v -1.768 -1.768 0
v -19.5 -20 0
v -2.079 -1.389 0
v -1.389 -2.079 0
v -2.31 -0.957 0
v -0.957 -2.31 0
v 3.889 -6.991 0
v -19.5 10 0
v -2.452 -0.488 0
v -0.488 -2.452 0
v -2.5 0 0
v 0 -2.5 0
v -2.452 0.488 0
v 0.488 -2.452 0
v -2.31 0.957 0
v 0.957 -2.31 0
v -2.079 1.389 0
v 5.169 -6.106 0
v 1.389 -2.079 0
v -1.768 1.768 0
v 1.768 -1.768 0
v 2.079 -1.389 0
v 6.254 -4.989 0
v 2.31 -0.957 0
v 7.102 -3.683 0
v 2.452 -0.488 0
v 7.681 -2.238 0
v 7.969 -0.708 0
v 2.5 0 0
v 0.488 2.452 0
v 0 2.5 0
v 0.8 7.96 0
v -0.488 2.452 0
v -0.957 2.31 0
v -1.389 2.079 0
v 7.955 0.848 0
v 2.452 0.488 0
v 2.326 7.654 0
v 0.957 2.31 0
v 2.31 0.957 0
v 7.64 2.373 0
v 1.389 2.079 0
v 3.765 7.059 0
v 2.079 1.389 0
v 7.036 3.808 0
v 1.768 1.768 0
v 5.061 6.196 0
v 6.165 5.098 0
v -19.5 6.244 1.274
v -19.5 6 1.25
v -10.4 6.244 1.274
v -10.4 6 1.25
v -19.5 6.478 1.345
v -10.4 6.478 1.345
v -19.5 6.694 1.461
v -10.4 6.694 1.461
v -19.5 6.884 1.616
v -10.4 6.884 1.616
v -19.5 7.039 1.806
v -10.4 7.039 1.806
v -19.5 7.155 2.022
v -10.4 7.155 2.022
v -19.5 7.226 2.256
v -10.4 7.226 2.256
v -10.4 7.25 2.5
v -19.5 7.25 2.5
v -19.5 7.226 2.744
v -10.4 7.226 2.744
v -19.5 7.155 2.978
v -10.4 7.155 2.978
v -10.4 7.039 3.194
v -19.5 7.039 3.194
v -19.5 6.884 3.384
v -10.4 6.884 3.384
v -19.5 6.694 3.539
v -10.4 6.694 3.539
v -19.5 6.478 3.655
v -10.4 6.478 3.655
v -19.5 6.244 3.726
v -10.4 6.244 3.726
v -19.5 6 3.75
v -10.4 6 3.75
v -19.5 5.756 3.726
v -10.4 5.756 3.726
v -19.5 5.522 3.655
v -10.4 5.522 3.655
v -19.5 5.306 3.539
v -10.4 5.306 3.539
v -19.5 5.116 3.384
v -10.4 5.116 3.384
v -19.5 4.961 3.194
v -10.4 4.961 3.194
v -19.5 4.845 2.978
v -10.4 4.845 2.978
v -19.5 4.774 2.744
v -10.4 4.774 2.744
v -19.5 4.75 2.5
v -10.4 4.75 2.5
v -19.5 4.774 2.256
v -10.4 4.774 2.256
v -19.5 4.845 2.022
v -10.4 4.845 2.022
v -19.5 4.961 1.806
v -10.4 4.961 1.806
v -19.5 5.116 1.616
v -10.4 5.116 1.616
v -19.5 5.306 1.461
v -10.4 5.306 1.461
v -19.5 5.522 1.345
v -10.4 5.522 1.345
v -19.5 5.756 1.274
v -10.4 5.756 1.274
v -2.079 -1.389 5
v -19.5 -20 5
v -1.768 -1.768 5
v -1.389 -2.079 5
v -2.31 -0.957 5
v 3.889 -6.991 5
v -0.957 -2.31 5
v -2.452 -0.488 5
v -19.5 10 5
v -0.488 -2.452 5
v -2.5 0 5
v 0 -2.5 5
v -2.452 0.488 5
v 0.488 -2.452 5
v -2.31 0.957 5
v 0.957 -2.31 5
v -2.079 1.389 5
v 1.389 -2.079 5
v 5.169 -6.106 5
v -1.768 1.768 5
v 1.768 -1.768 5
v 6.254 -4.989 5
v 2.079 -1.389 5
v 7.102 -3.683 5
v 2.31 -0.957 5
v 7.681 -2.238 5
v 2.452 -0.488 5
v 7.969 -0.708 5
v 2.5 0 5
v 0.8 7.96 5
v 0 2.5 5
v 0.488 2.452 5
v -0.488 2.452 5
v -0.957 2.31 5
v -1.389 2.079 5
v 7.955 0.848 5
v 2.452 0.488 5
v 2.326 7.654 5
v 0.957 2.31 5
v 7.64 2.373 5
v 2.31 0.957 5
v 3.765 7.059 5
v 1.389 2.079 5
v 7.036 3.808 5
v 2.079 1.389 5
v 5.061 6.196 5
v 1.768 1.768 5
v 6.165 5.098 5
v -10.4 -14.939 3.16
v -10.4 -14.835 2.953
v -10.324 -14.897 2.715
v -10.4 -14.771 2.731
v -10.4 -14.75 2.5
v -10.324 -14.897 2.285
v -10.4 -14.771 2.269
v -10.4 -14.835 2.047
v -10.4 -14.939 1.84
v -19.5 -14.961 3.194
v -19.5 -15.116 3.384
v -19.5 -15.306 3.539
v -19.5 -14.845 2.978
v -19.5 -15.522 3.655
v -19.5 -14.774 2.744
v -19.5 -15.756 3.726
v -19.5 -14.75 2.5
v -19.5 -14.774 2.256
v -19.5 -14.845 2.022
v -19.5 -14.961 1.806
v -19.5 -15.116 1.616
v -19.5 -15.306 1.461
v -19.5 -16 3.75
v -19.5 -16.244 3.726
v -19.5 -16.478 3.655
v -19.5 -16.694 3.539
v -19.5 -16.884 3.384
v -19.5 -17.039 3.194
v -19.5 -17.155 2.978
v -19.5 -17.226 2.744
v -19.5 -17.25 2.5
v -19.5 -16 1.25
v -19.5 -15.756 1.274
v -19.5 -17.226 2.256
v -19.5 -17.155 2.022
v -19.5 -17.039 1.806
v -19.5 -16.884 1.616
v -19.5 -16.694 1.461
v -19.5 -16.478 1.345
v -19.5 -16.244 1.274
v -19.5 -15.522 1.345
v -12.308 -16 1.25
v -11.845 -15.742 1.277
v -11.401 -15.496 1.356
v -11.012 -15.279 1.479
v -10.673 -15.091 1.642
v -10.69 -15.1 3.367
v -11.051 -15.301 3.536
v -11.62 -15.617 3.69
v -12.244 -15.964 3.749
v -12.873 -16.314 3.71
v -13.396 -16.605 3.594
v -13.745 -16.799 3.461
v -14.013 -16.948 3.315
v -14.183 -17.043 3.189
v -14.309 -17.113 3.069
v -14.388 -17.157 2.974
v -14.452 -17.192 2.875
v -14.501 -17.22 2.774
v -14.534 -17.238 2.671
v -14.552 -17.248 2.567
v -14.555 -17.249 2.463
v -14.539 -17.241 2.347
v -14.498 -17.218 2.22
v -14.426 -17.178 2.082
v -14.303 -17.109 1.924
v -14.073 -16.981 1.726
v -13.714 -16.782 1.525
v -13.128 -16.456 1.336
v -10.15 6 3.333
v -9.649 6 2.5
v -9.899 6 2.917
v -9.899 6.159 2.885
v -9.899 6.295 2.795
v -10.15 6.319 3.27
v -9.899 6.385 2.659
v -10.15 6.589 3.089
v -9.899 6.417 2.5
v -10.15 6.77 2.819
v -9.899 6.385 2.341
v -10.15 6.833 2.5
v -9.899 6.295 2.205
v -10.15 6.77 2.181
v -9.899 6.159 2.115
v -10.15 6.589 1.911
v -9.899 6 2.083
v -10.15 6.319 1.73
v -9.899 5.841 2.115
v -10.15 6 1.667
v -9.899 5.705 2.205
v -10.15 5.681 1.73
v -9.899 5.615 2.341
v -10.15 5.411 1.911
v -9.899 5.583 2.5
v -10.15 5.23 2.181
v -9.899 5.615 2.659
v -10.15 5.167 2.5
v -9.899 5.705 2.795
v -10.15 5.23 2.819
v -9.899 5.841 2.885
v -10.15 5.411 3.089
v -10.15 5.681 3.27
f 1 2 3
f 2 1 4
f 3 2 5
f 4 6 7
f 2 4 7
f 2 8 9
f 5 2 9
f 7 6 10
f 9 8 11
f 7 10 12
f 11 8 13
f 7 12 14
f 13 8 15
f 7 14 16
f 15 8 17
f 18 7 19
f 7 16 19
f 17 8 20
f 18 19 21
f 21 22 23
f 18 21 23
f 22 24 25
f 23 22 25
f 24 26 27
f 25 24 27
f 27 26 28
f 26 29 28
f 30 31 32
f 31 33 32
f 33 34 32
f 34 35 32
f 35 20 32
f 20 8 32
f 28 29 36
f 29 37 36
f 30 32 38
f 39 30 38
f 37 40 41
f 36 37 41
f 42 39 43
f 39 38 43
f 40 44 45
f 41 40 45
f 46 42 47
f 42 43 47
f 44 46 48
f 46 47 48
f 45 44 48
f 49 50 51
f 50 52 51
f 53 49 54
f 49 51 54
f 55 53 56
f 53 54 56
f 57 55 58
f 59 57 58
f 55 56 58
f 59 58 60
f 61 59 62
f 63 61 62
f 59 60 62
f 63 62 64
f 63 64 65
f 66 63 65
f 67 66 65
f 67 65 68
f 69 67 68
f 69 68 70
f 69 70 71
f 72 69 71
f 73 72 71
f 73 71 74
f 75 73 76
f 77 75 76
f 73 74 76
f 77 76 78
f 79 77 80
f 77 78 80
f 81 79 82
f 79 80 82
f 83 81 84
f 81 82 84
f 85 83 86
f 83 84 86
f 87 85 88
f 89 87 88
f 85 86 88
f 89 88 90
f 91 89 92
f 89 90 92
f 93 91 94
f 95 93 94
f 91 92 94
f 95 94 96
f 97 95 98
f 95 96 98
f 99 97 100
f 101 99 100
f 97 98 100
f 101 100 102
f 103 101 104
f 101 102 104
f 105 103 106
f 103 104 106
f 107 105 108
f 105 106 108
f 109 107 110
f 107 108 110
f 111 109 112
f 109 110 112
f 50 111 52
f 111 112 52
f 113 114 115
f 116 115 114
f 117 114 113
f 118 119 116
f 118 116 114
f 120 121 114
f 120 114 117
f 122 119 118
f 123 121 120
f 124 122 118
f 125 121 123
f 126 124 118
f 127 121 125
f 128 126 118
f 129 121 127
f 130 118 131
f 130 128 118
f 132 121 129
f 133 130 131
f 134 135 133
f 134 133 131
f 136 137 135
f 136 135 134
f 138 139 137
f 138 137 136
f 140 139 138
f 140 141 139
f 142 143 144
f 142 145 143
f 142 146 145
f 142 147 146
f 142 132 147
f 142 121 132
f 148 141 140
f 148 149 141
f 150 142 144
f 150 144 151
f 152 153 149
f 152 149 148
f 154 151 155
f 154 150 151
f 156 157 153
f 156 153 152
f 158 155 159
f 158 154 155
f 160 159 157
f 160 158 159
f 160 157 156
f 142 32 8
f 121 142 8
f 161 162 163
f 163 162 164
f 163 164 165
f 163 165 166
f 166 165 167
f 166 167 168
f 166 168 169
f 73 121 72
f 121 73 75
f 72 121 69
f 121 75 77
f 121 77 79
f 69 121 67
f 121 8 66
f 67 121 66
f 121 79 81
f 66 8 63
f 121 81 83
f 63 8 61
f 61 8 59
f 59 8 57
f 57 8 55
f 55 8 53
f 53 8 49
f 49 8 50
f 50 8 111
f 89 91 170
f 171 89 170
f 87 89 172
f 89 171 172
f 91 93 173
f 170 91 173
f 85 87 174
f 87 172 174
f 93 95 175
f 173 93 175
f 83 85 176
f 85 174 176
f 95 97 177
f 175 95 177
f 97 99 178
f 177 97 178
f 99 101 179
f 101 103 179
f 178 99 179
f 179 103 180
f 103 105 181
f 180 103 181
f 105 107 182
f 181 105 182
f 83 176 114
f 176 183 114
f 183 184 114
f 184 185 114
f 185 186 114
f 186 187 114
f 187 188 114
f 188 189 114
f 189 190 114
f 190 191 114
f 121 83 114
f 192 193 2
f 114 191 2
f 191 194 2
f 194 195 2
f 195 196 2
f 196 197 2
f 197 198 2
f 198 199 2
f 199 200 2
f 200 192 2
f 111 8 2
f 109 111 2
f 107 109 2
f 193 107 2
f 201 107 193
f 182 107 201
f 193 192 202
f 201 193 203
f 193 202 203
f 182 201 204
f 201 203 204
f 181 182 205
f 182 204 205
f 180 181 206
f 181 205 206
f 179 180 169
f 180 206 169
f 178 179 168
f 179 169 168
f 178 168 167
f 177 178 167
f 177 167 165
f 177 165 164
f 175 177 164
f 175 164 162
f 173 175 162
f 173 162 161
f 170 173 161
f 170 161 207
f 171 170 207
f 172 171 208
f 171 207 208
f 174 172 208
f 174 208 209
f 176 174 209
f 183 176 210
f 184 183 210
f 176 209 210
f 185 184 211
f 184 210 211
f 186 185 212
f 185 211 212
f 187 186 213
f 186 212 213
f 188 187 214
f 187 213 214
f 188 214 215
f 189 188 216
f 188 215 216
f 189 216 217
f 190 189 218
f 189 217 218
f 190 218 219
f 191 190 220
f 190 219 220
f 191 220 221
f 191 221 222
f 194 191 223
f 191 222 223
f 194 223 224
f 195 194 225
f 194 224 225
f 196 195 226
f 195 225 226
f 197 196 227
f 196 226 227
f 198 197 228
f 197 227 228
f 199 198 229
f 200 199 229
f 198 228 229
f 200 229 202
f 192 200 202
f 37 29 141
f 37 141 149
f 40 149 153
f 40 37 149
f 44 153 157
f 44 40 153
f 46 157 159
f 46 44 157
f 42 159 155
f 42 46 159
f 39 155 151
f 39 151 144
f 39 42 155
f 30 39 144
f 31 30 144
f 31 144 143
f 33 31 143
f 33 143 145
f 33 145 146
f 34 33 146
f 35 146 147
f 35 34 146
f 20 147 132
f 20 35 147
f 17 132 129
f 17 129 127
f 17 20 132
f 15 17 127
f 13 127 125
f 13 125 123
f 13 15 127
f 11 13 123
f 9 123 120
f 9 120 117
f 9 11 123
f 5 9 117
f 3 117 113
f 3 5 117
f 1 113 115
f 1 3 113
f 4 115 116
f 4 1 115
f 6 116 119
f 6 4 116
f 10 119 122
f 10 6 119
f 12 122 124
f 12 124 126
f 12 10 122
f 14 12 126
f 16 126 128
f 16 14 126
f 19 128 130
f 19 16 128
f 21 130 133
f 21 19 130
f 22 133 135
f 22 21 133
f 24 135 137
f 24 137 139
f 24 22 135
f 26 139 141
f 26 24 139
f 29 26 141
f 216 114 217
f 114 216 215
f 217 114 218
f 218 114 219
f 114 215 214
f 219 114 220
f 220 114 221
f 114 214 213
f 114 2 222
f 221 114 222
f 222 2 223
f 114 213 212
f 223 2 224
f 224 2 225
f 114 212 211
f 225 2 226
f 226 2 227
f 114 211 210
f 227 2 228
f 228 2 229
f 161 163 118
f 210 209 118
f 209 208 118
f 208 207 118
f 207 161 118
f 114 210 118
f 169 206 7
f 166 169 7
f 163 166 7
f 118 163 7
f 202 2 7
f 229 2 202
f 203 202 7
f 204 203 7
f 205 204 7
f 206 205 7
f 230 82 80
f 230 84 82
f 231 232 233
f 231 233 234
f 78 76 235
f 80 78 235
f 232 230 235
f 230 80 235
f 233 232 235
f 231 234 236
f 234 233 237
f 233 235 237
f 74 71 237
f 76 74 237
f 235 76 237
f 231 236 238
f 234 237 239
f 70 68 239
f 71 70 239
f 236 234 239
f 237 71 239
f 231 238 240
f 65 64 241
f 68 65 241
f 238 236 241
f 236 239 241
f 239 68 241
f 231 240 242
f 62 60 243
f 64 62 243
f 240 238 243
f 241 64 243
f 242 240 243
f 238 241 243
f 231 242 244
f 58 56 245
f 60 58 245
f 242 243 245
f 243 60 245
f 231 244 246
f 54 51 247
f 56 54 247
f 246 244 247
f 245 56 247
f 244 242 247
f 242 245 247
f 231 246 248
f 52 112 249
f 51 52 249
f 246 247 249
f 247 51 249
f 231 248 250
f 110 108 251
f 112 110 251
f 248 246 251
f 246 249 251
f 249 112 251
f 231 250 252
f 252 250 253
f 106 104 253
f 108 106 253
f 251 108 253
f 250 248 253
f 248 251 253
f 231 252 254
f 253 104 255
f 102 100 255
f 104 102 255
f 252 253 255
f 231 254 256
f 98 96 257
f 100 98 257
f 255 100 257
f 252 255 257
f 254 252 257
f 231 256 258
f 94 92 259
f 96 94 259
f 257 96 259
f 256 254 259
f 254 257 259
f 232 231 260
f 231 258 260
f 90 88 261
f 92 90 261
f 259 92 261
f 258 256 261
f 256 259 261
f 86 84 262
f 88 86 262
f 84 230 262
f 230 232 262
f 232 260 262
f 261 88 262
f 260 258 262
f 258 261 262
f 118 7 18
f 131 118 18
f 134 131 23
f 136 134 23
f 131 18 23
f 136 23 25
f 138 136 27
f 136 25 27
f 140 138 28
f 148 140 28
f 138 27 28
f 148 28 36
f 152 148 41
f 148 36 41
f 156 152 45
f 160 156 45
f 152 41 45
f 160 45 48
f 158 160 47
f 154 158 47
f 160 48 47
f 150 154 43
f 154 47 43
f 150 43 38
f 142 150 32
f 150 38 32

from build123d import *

# Parameters (mm, degrees)
ESQUISSE1_R               = 2.5
EXTRUSION1_DEPTH          = 5
TROU_TARAUD_M3X0_51_D     = 2.5
TROU_TARAUD_M3X0_51_DEPTH = 9.1
TROU_TARAUD_M3X0_51_TIP   = 0.751075774


with BuildPart() as part:
    # Esquisse1 → Extrusion1 (new body)
    with BuildSketch(Plane.XY):
        with BuildLine():
            Line((-19.5, 10), (-19.5, -20))
            Line((-19.5, -20), (3.888568512, -6.991354299))
            ThreePointArc((3.888568512, -6.991354299), (7.834576447, 1.618459728), (0.799950986, 7.959904423))
            Line((0.799950986, 7.959904423), (-19.5, 10))
        make_face()
        Circle(ESQUISSE1_R, mode=Mode.SUBTRACT)
    extrude(amount=EXTRUSION1_DEPTH)

    # Trou taraudé M3x0.51
    with Locations(Plane.ZY.offset(19.5)):
        with Locations((2.5, 6), (2.5, -16)):
            Hole(TROU_TARAUD_M3X0_51_D / 2, depth=TROU_TARAUD_M3X0_51_DEPTH)
            with Locations((0, 0, -(TROU_TARAUD_M3X0_51_DEPTH + TROU_TARAUD_M3X0_51_TIP / 2))):  # 118° drill point
                Cone(0, TROU_TARAUD_M3X0_51_D / 2, TROU_TARAUD_M3X0_51_TIP, mode=Mode.SUBTRACT)


solid = part.part
